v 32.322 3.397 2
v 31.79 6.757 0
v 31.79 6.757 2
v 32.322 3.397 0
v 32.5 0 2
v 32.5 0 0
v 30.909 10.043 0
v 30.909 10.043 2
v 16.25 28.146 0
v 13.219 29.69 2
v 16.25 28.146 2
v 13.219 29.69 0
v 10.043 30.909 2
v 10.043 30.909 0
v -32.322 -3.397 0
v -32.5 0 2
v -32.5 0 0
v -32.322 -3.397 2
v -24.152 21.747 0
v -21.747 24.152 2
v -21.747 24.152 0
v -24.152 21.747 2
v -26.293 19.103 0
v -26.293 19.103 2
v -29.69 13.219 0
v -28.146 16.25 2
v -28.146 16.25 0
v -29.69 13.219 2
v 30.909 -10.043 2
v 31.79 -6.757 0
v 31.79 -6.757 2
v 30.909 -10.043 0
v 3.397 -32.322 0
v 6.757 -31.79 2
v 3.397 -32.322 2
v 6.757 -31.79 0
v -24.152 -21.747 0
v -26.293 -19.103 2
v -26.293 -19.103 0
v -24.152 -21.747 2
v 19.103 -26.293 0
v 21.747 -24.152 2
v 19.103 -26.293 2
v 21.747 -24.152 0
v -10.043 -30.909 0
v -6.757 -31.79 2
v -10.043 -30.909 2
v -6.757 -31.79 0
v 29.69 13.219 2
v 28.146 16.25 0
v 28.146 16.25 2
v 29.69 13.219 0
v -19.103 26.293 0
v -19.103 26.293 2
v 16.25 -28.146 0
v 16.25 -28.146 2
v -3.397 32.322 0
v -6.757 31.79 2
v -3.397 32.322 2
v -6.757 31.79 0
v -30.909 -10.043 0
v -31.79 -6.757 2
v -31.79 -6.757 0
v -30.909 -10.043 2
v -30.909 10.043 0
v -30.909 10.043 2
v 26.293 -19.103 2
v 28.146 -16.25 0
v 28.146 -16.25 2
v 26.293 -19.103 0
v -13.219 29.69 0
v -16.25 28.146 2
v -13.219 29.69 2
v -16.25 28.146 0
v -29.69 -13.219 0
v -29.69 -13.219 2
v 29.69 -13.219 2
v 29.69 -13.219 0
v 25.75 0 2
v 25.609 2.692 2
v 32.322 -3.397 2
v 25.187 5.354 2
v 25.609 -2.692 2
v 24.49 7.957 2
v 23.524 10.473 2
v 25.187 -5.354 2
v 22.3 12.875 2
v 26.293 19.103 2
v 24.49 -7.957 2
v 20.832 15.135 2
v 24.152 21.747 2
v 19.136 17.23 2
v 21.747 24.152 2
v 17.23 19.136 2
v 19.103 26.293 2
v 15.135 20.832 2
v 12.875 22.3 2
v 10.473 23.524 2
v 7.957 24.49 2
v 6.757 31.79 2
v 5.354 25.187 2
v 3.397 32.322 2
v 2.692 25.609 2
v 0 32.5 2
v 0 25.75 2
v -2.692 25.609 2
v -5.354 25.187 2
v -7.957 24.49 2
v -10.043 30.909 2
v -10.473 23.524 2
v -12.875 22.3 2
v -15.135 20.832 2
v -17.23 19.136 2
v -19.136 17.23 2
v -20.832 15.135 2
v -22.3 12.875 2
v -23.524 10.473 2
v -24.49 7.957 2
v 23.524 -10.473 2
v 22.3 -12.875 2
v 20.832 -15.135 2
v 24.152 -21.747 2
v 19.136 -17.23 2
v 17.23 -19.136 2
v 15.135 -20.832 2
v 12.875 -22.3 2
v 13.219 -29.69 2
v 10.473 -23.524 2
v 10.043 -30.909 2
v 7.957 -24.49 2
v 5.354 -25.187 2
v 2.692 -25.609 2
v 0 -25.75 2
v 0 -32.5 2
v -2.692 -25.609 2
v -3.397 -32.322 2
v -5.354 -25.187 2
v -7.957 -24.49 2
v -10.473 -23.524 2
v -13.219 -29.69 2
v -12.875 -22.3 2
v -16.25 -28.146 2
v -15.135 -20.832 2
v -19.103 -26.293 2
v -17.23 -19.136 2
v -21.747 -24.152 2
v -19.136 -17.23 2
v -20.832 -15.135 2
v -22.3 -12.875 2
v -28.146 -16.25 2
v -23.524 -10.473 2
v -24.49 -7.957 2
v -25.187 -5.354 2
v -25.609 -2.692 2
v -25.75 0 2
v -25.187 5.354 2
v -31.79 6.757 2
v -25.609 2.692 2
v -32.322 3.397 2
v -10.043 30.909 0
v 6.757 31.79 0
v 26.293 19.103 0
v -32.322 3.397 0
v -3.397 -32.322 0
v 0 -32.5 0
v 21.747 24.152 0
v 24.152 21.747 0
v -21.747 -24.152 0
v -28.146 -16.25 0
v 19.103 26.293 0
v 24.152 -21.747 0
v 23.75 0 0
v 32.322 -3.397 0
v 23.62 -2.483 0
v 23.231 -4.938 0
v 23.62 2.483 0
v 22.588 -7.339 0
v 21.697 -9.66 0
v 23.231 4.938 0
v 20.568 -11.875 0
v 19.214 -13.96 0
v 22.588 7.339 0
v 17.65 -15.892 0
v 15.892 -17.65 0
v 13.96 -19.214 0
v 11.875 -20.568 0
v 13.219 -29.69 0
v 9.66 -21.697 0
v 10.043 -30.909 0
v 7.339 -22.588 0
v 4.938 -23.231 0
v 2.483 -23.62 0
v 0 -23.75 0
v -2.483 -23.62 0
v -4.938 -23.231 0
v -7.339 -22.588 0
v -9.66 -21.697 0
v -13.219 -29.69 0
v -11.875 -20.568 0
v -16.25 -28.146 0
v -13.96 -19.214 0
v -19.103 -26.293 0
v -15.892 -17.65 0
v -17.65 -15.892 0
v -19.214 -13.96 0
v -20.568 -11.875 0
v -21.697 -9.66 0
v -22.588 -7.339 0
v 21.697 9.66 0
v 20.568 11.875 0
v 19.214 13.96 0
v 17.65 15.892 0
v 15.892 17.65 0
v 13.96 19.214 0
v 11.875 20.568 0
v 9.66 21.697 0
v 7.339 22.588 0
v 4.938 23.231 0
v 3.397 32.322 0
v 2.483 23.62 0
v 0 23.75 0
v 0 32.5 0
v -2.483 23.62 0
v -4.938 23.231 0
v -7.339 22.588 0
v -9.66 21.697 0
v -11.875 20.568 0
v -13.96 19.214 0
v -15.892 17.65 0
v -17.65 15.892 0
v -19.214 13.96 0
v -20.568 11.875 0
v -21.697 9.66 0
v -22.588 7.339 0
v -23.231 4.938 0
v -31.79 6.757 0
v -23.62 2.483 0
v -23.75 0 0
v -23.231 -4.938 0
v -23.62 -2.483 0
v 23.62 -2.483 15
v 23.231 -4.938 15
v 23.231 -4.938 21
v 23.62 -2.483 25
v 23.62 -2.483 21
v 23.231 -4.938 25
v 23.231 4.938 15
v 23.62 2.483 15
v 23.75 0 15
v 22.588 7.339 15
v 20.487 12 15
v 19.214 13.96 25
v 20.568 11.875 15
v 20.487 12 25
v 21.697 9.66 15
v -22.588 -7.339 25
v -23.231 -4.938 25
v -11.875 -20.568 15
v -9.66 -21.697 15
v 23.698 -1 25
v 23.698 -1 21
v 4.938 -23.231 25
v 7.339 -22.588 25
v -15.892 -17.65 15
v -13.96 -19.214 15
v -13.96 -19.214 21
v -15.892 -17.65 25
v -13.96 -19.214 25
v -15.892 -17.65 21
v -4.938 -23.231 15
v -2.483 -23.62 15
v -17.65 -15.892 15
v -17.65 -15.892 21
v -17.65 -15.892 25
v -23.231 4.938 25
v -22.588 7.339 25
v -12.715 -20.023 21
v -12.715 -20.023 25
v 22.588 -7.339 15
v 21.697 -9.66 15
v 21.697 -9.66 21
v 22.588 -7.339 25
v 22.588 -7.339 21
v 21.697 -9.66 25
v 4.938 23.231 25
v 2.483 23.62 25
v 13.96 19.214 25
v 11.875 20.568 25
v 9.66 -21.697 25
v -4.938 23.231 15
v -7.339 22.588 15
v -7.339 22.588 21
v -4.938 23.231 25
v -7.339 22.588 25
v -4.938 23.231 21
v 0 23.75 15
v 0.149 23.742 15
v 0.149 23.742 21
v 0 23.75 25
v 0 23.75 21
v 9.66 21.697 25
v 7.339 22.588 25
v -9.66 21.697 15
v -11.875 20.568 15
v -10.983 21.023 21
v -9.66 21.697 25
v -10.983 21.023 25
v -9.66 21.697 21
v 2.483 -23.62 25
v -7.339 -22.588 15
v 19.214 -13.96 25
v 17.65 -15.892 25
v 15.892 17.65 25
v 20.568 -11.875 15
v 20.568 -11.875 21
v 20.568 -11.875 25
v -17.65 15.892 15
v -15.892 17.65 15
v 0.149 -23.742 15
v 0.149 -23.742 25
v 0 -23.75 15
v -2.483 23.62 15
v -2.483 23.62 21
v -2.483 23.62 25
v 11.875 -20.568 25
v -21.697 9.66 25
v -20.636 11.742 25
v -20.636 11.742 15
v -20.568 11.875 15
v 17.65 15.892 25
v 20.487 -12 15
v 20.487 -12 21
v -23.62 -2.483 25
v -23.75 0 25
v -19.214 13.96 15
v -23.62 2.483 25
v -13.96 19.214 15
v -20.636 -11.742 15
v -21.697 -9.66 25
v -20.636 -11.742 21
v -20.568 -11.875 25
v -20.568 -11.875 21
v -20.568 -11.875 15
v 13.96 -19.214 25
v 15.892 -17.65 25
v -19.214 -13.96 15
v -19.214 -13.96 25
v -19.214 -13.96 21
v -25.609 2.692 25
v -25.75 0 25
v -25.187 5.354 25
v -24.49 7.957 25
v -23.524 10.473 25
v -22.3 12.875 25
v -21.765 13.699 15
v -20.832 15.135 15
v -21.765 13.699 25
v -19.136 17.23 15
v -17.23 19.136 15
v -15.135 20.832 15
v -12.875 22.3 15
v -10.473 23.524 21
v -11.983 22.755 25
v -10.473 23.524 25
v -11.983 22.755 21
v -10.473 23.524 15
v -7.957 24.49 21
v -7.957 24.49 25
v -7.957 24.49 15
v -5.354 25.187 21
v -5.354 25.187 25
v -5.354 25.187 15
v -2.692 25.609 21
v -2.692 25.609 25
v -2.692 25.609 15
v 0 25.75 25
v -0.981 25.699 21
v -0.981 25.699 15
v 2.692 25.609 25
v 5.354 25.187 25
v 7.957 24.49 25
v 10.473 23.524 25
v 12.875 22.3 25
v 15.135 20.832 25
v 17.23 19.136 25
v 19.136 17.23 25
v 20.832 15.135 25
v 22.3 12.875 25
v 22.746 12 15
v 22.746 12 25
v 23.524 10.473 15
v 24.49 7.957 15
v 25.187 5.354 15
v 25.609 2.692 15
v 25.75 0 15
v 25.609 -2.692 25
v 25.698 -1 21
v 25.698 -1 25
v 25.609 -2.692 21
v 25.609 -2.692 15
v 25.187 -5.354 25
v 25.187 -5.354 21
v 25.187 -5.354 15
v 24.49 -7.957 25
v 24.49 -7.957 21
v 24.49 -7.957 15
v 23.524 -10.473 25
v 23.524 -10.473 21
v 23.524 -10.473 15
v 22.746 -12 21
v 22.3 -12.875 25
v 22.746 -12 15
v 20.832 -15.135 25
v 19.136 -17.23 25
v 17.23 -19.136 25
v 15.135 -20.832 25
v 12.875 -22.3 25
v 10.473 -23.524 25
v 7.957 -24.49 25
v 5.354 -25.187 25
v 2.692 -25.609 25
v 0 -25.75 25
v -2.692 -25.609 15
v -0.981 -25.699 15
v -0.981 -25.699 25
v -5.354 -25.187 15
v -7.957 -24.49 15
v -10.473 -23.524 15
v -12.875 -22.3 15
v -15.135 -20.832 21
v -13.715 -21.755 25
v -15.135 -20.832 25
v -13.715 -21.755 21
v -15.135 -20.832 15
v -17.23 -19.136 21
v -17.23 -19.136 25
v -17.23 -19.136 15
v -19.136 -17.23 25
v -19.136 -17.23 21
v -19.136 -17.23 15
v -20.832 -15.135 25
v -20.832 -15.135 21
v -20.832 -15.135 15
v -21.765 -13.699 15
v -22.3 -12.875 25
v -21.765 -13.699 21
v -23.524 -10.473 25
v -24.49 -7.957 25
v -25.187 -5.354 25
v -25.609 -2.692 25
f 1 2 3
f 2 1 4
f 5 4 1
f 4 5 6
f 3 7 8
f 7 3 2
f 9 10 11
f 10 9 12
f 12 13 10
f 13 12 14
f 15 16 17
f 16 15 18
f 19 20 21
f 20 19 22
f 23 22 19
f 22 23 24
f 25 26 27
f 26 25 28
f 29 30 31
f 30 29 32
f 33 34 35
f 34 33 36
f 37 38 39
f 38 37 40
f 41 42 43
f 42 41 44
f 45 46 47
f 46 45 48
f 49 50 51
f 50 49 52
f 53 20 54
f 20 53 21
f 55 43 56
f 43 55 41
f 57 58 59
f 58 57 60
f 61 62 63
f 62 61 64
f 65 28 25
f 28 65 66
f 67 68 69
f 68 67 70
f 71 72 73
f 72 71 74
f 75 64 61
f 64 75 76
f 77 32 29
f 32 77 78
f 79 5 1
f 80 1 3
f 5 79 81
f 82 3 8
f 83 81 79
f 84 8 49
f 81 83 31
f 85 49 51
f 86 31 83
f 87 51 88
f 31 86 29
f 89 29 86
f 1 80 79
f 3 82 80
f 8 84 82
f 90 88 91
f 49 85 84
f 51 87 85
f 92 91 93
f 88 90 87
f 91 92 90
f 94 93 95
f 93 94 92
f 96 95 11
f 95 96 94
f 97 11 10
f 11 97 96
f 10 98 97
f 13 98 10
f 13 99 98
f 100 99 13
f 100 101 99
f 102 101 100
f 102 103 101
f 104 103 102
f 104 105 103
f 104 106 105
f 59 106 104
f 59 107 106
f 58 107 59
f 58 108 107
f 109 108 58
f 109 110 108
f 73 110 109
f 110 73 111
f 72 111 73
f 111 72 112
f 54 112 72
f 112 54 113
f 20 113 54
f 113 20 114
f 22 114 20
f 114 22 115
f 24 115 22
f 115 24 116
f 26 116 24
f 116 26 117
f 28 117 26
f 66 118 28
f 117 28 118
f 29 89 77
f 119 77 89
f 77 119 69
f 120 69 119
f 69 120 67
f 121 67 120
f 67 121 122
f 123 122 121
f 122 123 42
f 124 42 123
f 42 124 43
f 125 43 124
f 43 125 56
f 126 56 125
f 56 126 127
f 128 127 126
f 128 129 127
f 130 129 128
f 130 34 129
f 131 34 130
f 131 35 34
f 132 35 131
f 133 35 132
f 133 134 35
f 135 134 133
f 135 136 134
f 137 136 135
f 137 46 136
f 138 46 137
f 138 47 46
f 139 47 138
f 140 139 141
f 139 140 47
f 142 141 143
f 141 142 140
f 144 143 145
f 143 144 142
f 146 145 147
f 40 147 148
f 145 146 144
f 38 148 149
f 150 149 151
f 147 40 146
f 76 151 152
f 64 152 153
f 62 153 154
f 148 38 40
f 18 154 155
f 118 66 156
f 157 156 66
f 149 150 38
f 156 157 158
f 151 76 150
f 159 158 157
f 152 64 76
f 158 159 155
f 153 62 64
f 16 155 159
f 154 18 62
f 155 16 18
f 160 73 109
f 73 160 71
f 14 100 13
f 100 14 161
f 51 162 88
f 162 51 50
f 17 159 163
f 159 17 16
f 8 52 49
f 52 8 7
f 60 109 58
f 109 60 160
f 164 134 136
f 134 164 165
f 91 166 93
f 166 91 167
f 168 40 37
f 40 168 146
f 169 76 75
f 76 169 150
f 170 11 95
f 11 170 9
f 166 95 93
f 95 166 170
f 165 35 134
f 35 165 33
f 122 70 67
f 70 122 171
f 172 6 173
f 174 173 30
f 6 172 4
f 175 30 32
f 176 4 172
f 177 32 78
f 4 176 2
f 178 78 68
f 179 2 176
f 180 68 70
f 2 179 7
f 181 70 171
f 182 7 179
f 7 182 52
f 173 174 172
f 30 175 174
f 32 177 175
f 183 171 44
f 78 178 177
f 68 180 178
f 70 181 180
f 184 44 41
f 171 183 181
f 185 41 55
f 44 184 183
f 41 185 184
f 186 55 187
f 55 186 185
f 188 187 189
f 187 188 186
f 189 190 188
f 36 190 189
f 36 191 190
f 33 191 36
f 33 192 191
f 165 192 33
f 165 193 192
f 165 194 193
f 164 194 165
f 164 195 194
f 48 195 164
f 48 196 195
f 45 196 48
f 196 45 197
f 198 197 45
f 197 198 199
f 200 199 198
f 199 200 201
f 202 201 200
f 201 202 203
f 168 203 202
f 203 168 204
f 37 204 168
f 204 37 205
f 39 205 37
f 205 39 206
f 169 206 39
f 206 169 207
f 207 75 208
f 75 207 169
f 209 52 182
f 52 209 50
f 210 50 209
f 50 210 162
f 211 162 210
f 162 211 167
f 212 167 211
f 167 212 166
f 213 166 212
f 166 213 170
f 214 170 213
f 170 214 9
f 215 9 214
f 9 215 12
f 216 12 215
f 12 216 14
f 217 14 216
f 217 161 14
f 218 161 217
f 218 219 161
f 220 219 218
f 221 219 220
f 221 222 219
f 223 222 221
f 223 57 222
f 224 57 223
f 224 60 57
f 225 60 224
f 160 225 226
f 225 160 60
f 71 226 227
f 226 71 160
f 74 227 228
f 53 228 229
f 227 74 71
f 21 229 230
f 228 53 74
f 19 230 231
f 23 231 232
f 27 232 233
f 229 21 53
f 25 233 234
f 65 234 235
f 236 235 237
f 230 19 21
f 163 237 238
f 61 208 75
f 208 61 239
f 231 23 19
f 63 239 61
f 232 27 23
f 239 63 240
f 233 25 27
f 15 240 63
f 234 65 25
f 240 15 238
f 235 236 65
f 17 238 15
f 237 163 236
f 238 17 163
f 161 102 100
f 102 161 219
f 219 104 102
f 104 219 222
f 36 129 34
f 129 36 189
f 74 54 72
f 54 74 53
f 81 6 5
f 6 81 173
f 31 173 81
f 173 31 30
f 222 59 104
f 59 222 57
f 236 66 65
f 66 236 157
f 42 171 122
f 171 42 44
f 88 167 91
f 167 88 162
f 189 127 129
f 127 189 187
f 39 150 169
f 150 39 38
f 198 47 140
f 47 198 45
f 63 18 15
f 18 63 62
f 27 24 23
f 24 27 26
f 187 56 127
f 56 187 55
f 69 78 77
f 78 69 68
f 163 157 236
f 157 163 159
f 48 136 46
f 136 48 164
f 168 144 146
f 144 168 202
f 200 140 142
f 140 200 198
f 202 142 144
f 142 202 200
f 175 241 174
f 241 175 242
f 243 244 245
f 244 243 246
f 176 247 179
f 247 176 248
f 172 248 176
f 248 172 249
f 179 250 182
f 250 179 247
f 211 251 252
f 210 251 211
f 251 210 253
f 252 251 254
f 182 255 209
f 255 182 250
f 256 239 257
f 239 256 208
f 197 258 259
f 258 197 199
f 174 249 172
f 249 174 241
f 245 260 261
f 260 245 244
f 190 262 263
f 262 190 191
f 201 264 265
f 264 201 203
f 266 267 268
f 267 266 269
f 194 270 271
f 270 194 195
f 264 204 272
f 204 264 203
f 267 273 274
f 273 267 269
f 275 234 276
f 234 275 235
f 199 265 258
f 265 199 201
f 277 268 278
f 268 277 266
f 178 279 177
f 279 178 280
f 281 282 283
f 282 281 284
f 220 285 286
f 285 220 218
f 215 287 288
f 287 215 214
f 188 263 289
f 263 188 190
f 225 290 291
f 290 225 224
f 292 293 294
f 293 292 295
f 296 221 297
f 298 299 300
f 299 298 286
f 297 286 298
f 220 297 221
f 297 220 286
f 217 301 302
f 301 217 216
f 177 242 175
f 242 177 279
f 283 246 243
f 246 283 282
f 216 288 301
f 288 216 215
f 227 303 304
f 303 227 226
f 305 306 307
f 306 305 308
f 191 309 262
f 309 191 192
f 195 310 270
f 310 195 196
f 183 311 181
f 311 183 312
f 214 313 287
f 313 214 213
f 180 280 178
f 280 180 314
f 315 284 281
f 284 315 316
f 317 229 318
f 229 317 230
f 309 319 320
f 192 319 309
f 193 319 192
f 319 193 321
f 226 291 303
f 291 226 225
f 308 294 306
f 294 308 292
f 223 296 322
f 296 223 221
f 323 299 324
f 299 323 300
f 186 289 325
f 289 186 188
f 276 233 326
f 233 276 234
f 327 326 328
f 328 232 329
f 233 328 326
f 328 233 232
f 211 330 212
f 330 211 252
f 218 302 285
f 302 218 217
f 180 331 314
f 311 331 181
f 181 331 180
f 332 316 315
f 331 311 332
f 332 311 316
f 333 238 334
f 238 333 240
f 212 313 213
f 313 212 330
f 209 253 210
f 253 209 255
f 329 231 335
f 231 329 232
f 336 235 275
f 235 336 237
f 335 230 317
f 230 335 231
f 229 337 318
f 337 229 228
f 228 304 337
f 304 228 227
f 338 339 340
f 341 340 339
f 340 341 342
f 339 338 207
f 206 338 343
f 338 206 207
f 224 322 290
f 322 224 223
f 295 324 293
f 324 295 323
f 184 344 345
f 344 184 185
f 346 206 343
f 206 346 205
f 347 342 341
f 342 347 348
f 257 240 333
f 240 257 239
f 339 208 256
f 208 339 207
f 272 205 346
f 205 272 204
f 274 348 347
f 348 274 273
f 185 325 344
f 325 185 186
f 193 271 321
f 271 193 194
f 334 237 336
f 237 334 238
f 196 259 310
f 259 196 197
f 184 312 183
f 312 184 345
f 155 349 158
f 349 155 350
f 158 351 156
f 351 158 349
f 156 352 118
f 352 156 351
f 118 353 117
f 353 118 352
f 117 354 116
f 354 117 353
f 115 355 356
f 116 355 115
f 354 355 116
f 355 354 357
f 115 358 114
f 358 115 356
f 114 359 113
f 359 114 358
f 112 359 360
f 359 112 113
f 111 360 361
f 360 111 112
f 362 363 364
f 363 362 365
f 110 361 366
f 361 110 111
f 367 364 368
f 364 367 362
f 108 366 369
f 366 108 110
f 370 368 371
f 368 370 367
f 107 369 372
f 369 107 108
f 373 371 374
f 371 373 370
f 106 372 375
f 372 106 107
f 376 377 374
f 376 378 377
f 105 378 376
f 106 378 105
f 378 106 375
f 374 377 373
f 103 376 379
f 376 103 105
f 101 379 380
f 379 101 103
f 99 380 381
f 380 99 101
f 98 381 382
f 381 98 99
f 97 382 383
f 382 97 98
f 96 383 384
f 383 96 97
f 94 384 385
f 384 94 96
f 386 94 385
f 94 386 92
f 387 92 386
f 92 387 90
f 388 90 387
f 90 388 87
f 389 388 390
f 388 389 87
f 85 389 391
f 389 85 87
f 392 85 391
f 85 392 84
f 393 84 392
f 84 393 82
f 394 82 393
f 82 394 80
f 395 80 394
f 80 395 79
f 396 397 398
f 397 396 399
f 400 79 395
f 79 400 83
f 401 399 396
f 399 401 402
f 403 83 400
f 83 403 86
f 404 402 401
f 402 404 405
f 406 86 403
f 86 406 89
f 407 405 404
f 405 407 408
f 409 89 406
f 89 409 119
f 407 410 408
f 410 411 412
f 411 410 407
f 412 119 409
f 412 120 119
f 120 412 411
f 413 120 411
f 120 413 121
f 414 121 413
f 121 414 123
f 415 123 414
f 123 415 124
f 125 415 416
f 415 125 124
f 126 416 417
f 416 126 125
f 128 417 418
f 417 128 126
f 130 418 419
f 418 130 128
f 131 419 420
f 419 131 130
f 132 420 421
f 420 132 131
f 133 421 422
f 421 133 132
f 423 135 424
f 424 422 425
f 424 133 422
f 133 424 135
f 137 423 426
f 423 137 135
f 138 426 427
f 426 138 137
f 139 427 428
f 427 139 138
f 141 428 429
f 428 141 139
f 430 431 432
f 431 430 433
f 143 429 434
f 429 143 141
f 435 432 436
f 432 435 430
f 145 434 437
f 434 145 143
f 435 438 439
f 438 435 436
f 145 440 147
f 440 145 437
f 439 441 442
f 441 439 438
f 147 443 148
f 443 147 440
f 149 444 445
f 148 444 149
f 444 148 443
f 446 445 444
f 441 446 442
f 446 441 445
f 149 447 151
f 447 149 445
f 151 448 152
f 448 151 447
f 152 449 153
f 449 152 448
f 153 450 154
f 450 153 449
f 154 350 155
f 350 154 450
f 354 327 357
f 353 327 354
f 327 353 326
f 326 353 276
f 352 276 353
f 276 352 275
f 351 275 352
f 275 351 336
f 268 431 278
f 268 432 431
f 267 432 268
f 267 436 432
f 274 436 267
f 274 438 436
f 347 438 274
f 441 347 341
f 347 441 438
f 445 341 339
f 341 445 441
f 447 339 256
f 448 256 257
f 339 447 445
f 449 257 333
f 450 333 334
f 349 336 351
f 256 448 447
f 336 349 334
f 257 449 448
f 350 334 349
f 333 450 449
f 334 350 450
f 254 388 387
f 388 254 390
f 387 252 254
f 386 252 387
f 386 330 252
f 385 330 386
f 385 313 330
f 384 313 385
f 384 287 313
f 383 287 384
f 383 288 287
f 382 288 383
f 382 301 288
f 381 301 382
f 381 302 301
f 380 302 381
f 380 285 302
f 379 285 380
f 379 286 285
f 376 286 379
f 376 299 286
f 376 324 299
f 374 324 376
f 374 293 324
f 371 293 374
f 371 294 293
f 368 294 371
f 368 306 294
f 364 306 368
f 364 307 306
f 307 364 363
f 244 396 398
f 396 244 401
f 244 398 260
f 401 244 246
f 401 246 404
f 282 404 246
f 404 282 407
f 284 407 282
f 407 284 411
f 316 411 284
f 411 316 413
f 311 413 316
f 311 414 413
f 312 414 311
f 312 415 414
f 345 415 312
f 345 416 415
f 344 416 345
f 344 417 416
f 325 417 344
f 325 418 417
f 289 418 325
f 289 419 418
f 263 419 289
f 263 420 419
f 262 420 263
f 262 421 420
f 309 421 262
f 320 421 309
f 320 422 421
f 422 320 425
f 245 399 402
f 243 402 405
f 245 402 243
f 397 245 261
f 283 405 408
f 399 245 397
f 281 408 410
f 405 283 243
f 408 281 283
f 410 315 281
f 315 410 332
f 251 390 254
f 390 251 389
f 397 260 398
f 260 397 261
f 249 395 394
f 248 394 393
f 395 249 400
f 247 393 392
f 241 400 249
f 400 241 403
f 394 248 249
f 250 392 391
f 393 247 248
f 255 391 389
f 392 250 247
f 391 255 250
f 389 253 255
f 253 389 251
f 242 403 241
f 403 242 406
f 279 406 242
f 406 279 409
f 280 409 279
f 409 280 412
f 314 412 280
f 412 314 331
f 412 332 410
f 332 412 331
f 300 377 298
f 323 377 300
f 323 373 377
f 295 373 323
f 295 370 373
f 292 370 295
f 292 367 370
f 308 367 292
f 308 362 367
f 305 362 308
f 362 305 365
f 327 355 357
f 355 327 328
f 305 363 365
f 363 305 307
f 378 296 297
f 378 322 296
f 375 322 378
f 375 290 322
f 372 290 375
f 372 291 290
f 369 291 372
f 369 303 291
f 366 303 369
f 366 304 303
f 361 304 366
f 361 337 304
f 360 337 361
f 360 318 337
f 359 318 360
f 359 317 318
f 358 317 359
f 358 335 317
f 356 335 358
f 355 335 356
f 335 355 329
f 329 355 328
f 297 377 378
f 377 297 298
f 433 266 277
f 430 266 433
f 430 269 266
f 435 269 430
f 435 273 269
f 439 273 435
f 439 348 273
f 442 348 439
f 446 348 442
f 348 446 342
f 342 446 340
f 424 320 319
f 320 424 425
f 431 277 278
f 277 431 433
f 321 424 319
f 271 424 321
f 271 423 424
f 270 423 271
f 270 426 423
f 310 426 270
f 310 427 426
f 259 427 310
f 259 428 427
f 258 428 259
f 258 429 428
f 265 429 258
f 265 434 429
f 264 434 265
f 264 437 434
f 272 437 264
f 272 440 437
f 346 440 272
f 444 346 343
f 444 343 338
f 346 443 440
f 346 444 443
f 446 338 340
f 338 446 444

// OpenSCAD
$fn = 60;
bushshell = 2;
bushheight = 25;
bushdiam = 47.5 ;
ringdiam = 65;
holediam = 47.5;
ringthk = 2 ;
primwd = 13 ;
primht = 4 ;
secwd = 24 ;
secht = 6;
module mainpart(bushdiam,bushshell,bushheight,ringthk,ringdiam,holediam) {
rotate_extrude(convexity = 10) translate([bushdiam/2,0,0]) square([bushshell,bushheight],0) ;  
difference () {
    cylinder(ringthk,ringdiam/2,ringdiam/2);
    translate([0,0,-.5]) 
    cylinder(ringthk+1,holediam/2,holediam/2);} 
}
module knockout(primwd,bushheight,primht,secwd,secht) {
    translate([0,-primwd/2,bushheight-primht]) 
        cube (size = [bushdiam/2+primwd,primwd,primht],center = false);
    translate([0,-secwd+primwd/2,bushheight-primht-secht]) 
        cube (size = [bushdiam/2+secwd/2,secwd,secht], center = false);  }
difference() {
mainpart(bushdiam,bushshell,bushheight,ringthk,ringdiam,holediam);        
translate([0,secwd/2-primwd/2,0])
        knockout(primwd,bushheight,primht,secwd,secht);
rotate([0,0,120]) translate([0,secwd/2-primwd/2,0])
        knockout(primwd,bushheight,primht,secwd,secht);
rotate([0,0,-120]) translate([0,secwd/2-primwd/2,0])
        knockout(primwd,bushheight,primht,secwd,secht); }
        
